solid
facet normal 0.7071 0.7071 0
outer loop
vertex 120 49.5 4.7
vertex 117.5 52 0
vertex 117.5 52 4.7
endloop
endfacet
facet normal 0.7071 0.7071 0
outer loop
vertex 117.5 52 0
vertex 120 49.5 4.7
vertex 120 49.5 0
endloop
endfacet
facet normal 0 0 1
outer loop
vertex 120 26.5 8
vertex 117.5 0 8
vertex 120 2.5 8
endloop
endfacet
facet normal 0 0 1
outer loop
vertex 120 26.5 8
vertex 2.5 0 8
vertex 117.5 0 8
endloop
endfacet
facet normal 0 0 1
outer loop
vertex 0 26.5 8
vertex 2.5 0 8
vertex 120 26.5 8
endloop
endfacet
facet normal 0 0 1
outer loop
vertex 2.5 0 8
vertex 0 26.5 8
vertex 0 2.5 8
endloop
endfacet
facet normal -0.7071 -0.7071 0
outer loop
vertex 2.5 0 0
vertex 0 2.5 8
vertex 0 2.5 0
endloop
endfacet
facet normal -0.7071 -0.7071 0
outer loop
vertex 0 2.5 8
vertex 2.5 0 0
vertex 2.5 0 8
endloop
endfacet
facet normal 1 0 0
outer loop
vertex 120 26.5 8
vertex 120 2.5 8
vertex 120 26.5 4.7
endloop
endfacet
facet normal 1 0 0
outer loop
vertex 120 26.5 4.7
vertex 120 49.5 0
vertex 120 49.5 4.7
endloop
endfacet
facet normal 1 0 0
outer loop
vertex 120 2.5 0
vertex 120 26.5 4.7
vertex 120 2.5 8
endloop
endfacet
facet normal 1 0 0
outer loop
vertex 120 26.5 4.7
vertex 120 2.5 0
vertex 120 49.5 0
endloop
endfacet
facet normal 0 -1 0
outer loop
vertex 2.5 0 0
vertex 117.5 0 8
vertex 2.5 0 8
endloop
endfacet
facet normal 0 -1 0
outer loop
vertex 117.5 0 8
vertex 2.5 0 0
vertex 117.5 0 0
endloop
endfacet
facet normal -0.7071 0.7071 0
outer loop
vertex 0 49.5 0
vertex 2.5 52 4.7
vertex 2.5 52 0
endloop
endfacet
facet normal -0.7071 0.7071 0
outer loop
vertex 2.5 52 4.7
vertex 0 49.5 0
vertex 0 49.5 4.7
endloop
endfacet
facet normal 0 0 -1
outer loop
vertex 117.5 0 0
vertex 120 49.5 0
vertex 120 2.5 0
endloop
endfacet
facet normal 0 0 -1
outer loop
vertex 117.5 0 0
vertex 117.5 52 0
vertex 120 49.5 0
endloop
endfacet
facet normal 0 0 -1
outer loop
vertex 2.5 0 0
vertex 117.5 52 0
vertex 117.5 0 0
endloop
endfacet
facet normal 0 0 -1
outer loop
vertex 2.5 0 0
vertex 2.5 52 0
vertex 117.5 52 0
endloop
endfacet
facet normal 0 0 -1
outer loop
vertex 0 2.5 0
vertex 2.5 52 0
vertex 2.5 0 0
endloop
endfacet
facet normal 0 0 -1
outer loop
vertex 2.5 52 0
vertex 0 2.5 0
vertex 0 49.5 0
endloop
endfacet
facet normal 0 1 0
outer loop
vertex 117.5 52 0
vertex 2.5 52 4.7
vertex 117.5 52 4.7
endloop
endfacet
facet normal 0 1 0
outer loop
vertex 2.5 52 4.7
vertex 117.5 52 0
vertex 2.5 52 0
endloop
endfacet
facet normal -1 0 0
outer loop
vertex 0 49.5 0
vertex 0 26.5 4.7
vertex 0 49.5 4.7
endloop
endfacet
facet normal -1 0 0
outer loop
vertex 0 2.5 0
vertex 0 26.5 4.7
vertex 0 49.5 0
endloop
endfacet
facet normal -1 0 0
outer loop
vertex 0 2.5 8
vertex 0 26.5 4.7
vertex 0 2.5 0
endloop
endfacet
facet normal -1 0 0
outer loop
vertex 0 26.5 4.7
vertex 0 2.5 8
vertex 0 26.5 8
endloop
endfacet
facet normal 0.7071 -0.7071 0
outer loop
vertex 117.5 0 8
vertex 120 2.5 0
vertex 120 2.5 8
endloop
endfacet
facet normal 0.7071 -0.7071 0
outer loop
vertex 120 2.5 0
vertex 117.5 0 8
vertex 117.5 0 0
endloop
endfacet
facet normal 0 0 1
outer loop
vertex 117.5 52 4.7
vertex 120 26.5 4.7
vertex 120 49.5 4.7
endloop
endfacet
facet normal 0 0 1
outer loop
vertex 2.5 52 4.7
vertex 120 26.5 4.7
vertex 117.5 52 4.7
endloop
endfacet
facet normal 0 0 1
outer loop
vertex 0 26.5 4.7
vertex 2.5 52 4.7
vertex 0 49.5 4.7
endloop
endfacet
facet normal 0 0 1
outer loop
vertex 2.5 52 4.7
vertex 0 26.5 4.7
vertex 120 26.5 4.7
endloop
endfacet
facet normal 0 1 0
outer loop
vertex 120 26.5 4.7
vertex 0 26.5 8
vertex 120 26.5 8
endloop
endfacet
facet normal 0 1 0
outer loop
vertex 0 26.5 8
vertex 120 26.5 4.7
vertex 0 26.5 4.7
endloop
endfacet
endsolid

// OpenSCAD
$fn = 32;

// ----------------------------------------------------------------------
// Stepped bar: sidestep, 120 x 52 x 8/4.7 mm
// ----------------------------------------------------------------------

// --- parameters (mm) ---
bar_l = 120;              // bar length, X
bar_w = 52;               // bar width, Y
plate_t = 8;              // thickness of the thick zone, Z
thin_t = 4.7;             // thickness of the thin zone
corner_c = 2.5;           // corner chamfer of the bar
step_cut = 3.3;           // material removed from the thin zone
ledge_y = 26.5;           // start of the ledge from the front edge
depth_1 = 3.3;            // depth of cut 1 from the top face

profile = [[2.5, 0], [117.5, 0], [120, 2.5], [120, 49.5], [117.5, 52], [2.5, 52], [0, 49.5], [0, 2.5]];  // primary outline, 8 points, counter clockwise
void_1 = [[-1, 26.5], [121, 26.5], [121, 53], [-1, 53]];  // ledge cut along one edge, 4 points

// --- the one profile operation ---
difference() {
  linear_extrude(height = plate_t) polygon(points = profile);
  translate([0, 0, plate_t - depth_1])
    linear_extrude(height = depth_1 + 1) polygon(points = void_1);
}
